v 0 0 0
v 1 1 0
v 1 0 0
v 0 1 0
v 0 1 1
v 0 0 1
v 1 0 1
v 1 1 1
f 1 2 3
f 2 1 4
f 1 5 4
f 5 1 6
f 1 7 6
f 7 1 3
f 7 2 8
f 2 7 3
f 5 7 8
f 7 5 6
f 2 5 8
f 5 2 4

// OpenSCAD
//------------------------------------------------------------------------------------------
// THIS CODE WAS GENERATED WITH GRAPHSCAD
//------------------------------------------------------------------------------------------
// Graphscad is a graphical nodal editor to create .SCAD files
//
// More info : http://graphscad.free.fr
//
// Scad Files created with Graphscad can be edited by graphscad
// Scad Files created with Graphscad can be read by Openscad
//
//------------------------------------------------------------------------------------------
module clamp()
{
 function node_clamp_matrix(i=0,j=0,k=0,l=0,m=0,n=0) = node_sphere_matrix(i=i,j=j,k=k,l=l,m=m,n=n);
 module node_clamp(i=0,j=0,k=0,l=0,m=0,n=0)
 {
  intersection()
  {
   {
    node_sphere(i,j,k,l,m,n);
   }
   translate([0,0,0])cube([1,1,1],center=false);
  }
 }
 function node_sphere_matrix(i=0,j=0,k=0,l=0,m=0,n=0) = translate([0,0,0]);
 module node_sphere(i=0,j=0,k=0,l=0,m=0,n=0)
 {
   sphere(r=1,$fn=128);
 }
 function node_cube_matrix(i=0,j=0,k=0,l=0,m=0,n=0) = translate([0,0,0]);
 module node_cube(i=0,j=0,k=0,l=0,m=0,n=0)
 {
  cube([1,1,1],center=false);
 }
 function node_color_matrix(i=0,j=0,k=0,l=0,m=0,n=0) = node_cube_matrix(i=i,j=j,k=k,l=l,m=m,n=n);
 module node_color(i=0,j=0,k=0,l=0,m=0,n=0)
 {
  {
   color([1,0,0,0.2])node_cube(i,j,k,l,m,n);
  }
 }
 node_clamp();
 node_color();
 /*--------------------------------------------------------------------------------------------------------
  Graphscad Utils functions
  This code is Used By Graphscad Nodal Editor to generate SCAD files
 --------------------------------------------------------------------------------------------------------*/
 function det4x4(a) =
 a[0][0]*a[1][1]*a[2][2]*a[3][3] + a[0][0]*a[1][2]*a[2][3]*a[3][1] + a[0][0]*a[1][3]*a[2][1]*a[3][2]
 + a[0][1]*a[1][0]*a[2][3]*a[3][2] + a[0][1]*a[1][2]*a[2][0]*a[3][3] + a[0][1]*a[1][3]*a[2][2]*a[3][0]
 + a[0][2]*a[1][0]*a[2][1]*a[3][3] + a[0][2]*a[1][1]*a[2][3]*a[3][0] + a[0][2]*a[1][3]*a[2][0]*a[3][1]
 + a[0][3]*a[1][0]*a[2][2]*a[3][1] + a[0][3]*a[1][1]*a[2][0]*a[3][2] + a[0][3]*a[1][2]*a[2][1]*a[3][0]
 - a[0][0]*a[1][1]*a[2][3]*a[3][2] - a[0][0]*a[1][2]*a[2][1]*a[3][3] - a[0][0]*a[1][3]*a[2][2]*a[3][1]
 - a[0][1]*a[1][0]*a[2][2]*a[3][3] - a[0][1]*a[1][2]*a[2][3]*a[3][0] - a[0][1]*a[1][3]*a[2][0]*a[3][2]
 - a[0][2]*a[1][0]*a[2][3]*a[3][1] - a[0][2]*a[1][1]*a[2][0]*a[3][3] - a[0][2]*a[1][3]*a[2][1]*a[3][0]
 - a[0][3]*a[1][0]*a[2][1]*a[3][2] - a[0][3]*a[1][1]*a[2][2]*a[3][0] - a[0][3]*a[1][2]*a[2][0]*a[3][1];
 function invb00(a) = a[1][1]*a[2][2]*a[3][3] + a[1][2]*a[2][3]*a[3][1] + a[1][3]*a[2][1]*a[3][2] - a[1][1]*a[2][3]*a[3][2] - a[1][2]*a[2][1]*a[3][3] - a[1][3]*a[2][2]*a[3][1];
 function invb01(a) = a[0][1]*a[2][3]*a[3][2] + a[0][2]*a[2][1]*a[3][3] + a[0][3]*a[2][2]*a[3][1] - a[0][1]*a[2][2]*a[3][3] - a[0][2]*a[2][3]*a[3][1] - a[0][3]*a[2][1]*a[3][2];
 function invb02(a) = a[0][1]*a[1][2]*a[3][3] + a[0][2]*a[1][3]*a[3][1] + a[0][3]*a[1][1]*a[3][2] - a[0][1]*a[1][3]*a[3][2] - a[0][2]*a[1][1]*a[3][3] - a[0][3]*a[1][2]*a[3][1];
 function invb03(a) = a[0][1]*a[1][3]*a[2][2] + a[0][2]*a[1][1]*a[2][3] + a[0][3]*a[1][2]*a[2][1] - a[0][1]*a[1][2]*a[2][3] - a[0][2]*a[1][3]*a[2][1] - a[0][3]*a[1][1]*a[2][2];
 function invb10(a) = a[1][0]*a[2][3]*a[3][2] + a[1][2]*a[2][0]*a[3][3] + a[1][3]*a[2][2]*a[3][0] - a[1][0]*a[2][2]*a[3][3] - a[1][2]*a[2][3]*a[3][0] - a[1][3]*a[2][0]*a[3][2];
 function invb11(a) = a[0][0]*a[2][2]*a[3][3] + a[0][2]*a[2][3]*a[3][0] + a[0][3]*a[2][0]*a[3][2] - a[0][0]*a[2][3]*a[3][2] - a[0][2]*a[2][0]*a[3][3] - a[0][3]*a[2][2]*a[3][0];
 function invb12(a) = a[0][0]*a[1][3]*a[3][2] + a[0][2]*a[1][0]*a[3][3] + a[0][3]*a[1][2]*a[3][0] - a[0][0]*a[1][2]*a[3][3] - a[0][2]*a[1][3]*a[3][0] - a[0][3]*a[1][0]*a[3][2];
 function invb13(a) = a[0][0]*a[1][2]*a[2][3] + a[0][2]*a[1][3]*a[2][0] + a[0][3]*a[1][0]*a[2][2] - a[0][0]*a[1][3]*a[2][2] - a[0][2]*a[1][0]*a[2][3] - a[0][3]*a[1][2]*a[2][0];
 function invb20(a) = a[1][0]*a[2][1]*a[3][3] + a[1][1]*a[2][3]*a[3][0] + a[1][3]*a[2][0]*a[3][1] - a[1][0]*a[2][3]*a[3][1] - a[1][1]*a[2][0]*a[3][3] - a[1][3]*a[2][1]*a[3][0];
 function invb21(a) = a[0][0]*a[2][3]*a[3][1] + a[0][1]*a[2][0]*a[3][3] + a[0][3]*a[2][1]*a[3][0] - a[0][0]*a[2][1]*a[3][3] - a[0][1]*a[2][3]*a[3][0] - a[0][3]*a[2][0]*a[3][1];
 function invb22(a) = a[0][0]*a[1][1]*a[3][3] + a[0][1]*a[1][3]*a[3][0] + a[0][3]*a[1][0]*a[3][1] - a[0][0]*a[1][3]*a[3][1] - a[0][1]*a[1][0]*a[3][3] - a[0][3]*a[1][1]*a[3][0];
 function invb23(a) = a[0][0]*a[1][3]*a[2][1] + a[0][1]*a[1][0]*a[2][3] + a[0][3]*a[1][1]*a[2][0] - a[0][0]*a[1][1]*a[2][3] - a[0][1]*a[1][3]*a[2][0] - a[0][3]*a[1][0]*a[2][1];
 function invb30(a) = a[1][0]*a[2][2]*a[3][1] + a[1][1]*a[2][0]*a[3][2] + a[1][2]*a[2][1]*a[3][0] - a[1][0]*a[2][1]*a[3][2] - a[1][1]*a[2][2]*a[3][0] - a[1][2]*a[2][0]*a[3][1];
 function invb31(a) = a[0][0]*a[2][1]*a[3][2] + a[0][1]*a[2][2]*a[3][0] + a[0][2]*a[2][0]*a[3][1] - a[0][0]*a[2][2]*a[3][1] - a[0][1]*a[2][0]*a[3][2] - a[0][2]*a[2][1]*a[3][0];
 function invb32(a) = a[0][0]*a[1][2]*a[3][1] + a[0][1]*a[1][0]*a[3][2] + a[0][2]*a[1][1]*a[3][0] - a[0][0]*a[1][1]*a[3][2] - a[0][1]*a[1][2]*a[3][0] - a[0][2]*a[1][0]*a[3][1];
 function invb33(a) = a[0][0]*a[1][1]*a[2][2] + a[0][1]*a[1][2]*a[2][0] + a[0][2]*a[1][0]*a[2][1] - a[0][0]*a[1][2]*a[2][1] - a[0][1]*a[1][0]*a[2][2] - a[0][2]*a[1][1]*a[2][0];
 function inv4x4(a)= (1/det4x4(a))*[
 [invb00(a),invb01(a),invb02(a),invb03(a)],
 [invb10(a),invb11(a),invb12(a),invb13(a)],
 [invb20(a),invb21(a),invb22(a),invb23(a)],
 [invb30(a),invb31(a),invb32(a),invb33(a)]];
 function onlytranslate(a)=  [
                        [1,0,0,a[0][3]],
                        [0,1,0,a[1][3]],
                        [0,0,1,a[2][3]],
                        [0,0,0,1]];
 function negonlytranslate(a)=[
                        [1,0,0,-a[0][3]],
                        [0,1,0,-a[1][3]],
                        [0,0,1,-a[2][3]],
                        [0,0,0,1]];
 function lookatvec(t,parentmat) = [t[0]-parentmat[0][3],
                                 t[1]-parentmat[1][3],
                                 t[2]-parentmat[2][3]];
 /*
              rx = '0'
              ry = 'acos('+tz+'/norm(['+tx+','+ty+','+tz+']))'
              rz = 'atan2('+ty+','+tx+')'
 */
 function lookatrot(t,parentmat) = [0,
                                 acos((t[2]-parentmat[2][3])/norm(lookatvec(t,parentmat))),
                                 atan2(t[1]-parentmat[1][3],t[0]-parentmat[0][3])];
 function gettranslation(m) = [m[0][3],m[1][3],m[2][3]];
 function vectormulmatrix(v,m) = m*v;
 function vectorlength(v) = norm(v);
 function vectorx(v) = v[0];
 function vectory(v) = v[1];
 function vectorz(v) = v[2];
 function vectoradd(a,b) = (a+b);
 function vectorsub(a,b) = (a-b);
 function vectormul(a,b) = (a*b);
 function vectordiv(a,b) = (a*(1/b));
 function scale(v)=[[v[0],0,0,0],
                    [0,v[1],0,0],
                    [0,0,v[2],0],
                    [0,0,0,1]];
 function rotatex(a)=[[1,0,0,0],
                      [0,cos(a),-sin(a),0],
                      [0,sin(a),cos(a),0],
                      [0,0,0,1]];
 function rotatey(a)=[[cos(a),0,sin(a),0],
                      [0,1,0,0],
                      [-sin(a),0,cos(a),0],
                      [0,0,0,1]];
 function rotatez(a)=[[cos(a),-sin(a),0,0],
                      [sin(a),cos(a),0,0],
                      [0,0,1,0],
                      [0,0,0,1]];
 function rotatea(c,s,l,m,n)=[[l*l*(1-c)+c,m*l*(1-c)-n*s,n*l*(1-c)+m*s,0],
                              [l*m*(1-c)+n*s,m*m*(1-c)+c,n*m*(1-c)-l*s,0],
                              [l*n*(1-c)-m*s,m*n*(1-c)+l*s,n*n*(1-c)+c,0],
                              [0,0,0,1]];
 function rotateanv(a,nv)=rotatea(cos(a),sin(a),nv[0],nv[1],nv[2]);
 function rotate(a,v, normV=true)=(v==undef)?rotatez(a[2])*rotatey(a[1])*rotatex(a[0]):
                      normV ? rotateanv(a,v/sqrt(v*v)) : rotateanv(a,v);
 function translate(v)=[[1,0,0,v[0]],
                        [0,1,0,v[1]],
                        [0,0,1,v[2]],
                        [0,0,0,1]];
 function mirrorabc(a,b,c)=[[1-2*a*a,-2*a*b,-2*a*c,0],
                            [-2*a*b,1-2*b*b,-2*b*c,0],
                            [-2*a*c,-2*b*c,1-2*c*c,0],
                            [0,0,0,1]];
 function mirrornv(nv)=mirrorabc(nv[0],nv[1],nv[2]);
 function mirror(v)=mirrornv(v/sqrt(v*v));
}
clamp();


/*BEGINGRAPHSCAD{
    "nodes": [
        {
            "name": "node_clamp",
            "inputplugs": [
                {
                    "connection": "node_sphere.object",
                    "type": "object",
                    "name": "object",
                    "value": ""
                },
                {
                    "type": "str",
                    "name": "x",
                    "value": "1"
                },
                {
                    "type": "str",
                    "name": "y",
                    "value": "1"
                },
                {
                    "type": "str",
                    "name": "z",
                    "value": "1"
                },
                {
                    "type": "str",
                    "name": "tx",
                    "value": "0"
                },
                {
                    "type": "str",
                    "name": "ty",
                    "value": "0"
                },
                {
                    "type": "str",
                    "name": "tz",
                    "value": "0"
                },
                {
                    "type": "str",
                    "name": "center",
                    "value": "false"
                }
            ],
            "typename": "Node_clamp",
            "version": 1,
            "y": -101.40960000000001,
            "x": 173.38400000000007
        },
        {
            "name": "node_sphere",
            "inputplugs": [
                {
                    "type": "str",
                    "name": "radius",
                    "value": "1"
                },
                {
                    "type": "str",
                    "name": "tx",
                    "value": "0"
                },
                {
                    "type": "str",
                    "name": "ty",
                    "value": "0"
                },
                {
                    "type": "str",
                    "name": "tz",
                    "value": "0"
                },
                {
                    "type": "str",
                    "name": "$fn",
                    "value": "128"
                }
            ],
            "typename": "Node_sphere",
            "version": 1,
            "y": -101.12831999999992,
            "x": -162.79609600000003
        },
        {
            "name": "node_cube",
            "inputplugs": [
                {
                    "type": "str",
                    "name": "sizex",
                    "value": "1"
                },
                {
                    "type": "str",
                    "name": "sizey",
                    "value": "1"
                },
                {
                    "type": "str",
                    "name": "sizez",
                    "value": "1"
                },
                {
                    "type": "str",
                    "name": "tx",
                    "value": "0"
                },
                {
                    "type": "str",
                    "name": "ty",
                    "value": "0"
                },
                {
                    "type": "str",
                    "name": "tz",
                    "value": "0"
                },
                {
                    "type": "str",
                    "name": "center",
                    "value": "false",
                    "combo": [
                        "true",
                        "false"
                    ]
                }
            ],
            "typename": "Node_cube",
            "version": 1,
            "y": 224.04928000000004,
            "x": -161.88729599999996
        },
        {
            "name": "node_color",
            "inputplugs": [
                {
                    "connection": "node_cube.object",
                    "type": "object",
                    "name": "object",
                    "value": ""
                },
                {
                    "type": "str",
                    "name": "r",
                    "value": "1"
                },
                {
                    "type": "str",
                    "name": "g",
                    "value": "0"
                },
                {
                    "type": "str",
                    "name": "b",
                    "value": "0"
                },
                {
                    "type": "str",
                    "name": "a",
                    "value": "0.2"
                }
            ],
            "typename": "Node_color",
            "version": 1,
            "y": 254.44928,
            "x": 148.03270399999997
        },
        {
            "name": "node_comment",
            "inputplugs": [
                {
                    "type": "str",
                    "name": "comment",
                    "value": "this is an example of a clamp node.\nsphere is clamped in node_clamp interval\n"
                }
            ],
            "typename": "Node_comment",
            "version": 1,
            "y": 140.54496,
            "x": -136.13183999999998
        }
    ],
    "version": 2
}ENDGRAPHSCAD*/
